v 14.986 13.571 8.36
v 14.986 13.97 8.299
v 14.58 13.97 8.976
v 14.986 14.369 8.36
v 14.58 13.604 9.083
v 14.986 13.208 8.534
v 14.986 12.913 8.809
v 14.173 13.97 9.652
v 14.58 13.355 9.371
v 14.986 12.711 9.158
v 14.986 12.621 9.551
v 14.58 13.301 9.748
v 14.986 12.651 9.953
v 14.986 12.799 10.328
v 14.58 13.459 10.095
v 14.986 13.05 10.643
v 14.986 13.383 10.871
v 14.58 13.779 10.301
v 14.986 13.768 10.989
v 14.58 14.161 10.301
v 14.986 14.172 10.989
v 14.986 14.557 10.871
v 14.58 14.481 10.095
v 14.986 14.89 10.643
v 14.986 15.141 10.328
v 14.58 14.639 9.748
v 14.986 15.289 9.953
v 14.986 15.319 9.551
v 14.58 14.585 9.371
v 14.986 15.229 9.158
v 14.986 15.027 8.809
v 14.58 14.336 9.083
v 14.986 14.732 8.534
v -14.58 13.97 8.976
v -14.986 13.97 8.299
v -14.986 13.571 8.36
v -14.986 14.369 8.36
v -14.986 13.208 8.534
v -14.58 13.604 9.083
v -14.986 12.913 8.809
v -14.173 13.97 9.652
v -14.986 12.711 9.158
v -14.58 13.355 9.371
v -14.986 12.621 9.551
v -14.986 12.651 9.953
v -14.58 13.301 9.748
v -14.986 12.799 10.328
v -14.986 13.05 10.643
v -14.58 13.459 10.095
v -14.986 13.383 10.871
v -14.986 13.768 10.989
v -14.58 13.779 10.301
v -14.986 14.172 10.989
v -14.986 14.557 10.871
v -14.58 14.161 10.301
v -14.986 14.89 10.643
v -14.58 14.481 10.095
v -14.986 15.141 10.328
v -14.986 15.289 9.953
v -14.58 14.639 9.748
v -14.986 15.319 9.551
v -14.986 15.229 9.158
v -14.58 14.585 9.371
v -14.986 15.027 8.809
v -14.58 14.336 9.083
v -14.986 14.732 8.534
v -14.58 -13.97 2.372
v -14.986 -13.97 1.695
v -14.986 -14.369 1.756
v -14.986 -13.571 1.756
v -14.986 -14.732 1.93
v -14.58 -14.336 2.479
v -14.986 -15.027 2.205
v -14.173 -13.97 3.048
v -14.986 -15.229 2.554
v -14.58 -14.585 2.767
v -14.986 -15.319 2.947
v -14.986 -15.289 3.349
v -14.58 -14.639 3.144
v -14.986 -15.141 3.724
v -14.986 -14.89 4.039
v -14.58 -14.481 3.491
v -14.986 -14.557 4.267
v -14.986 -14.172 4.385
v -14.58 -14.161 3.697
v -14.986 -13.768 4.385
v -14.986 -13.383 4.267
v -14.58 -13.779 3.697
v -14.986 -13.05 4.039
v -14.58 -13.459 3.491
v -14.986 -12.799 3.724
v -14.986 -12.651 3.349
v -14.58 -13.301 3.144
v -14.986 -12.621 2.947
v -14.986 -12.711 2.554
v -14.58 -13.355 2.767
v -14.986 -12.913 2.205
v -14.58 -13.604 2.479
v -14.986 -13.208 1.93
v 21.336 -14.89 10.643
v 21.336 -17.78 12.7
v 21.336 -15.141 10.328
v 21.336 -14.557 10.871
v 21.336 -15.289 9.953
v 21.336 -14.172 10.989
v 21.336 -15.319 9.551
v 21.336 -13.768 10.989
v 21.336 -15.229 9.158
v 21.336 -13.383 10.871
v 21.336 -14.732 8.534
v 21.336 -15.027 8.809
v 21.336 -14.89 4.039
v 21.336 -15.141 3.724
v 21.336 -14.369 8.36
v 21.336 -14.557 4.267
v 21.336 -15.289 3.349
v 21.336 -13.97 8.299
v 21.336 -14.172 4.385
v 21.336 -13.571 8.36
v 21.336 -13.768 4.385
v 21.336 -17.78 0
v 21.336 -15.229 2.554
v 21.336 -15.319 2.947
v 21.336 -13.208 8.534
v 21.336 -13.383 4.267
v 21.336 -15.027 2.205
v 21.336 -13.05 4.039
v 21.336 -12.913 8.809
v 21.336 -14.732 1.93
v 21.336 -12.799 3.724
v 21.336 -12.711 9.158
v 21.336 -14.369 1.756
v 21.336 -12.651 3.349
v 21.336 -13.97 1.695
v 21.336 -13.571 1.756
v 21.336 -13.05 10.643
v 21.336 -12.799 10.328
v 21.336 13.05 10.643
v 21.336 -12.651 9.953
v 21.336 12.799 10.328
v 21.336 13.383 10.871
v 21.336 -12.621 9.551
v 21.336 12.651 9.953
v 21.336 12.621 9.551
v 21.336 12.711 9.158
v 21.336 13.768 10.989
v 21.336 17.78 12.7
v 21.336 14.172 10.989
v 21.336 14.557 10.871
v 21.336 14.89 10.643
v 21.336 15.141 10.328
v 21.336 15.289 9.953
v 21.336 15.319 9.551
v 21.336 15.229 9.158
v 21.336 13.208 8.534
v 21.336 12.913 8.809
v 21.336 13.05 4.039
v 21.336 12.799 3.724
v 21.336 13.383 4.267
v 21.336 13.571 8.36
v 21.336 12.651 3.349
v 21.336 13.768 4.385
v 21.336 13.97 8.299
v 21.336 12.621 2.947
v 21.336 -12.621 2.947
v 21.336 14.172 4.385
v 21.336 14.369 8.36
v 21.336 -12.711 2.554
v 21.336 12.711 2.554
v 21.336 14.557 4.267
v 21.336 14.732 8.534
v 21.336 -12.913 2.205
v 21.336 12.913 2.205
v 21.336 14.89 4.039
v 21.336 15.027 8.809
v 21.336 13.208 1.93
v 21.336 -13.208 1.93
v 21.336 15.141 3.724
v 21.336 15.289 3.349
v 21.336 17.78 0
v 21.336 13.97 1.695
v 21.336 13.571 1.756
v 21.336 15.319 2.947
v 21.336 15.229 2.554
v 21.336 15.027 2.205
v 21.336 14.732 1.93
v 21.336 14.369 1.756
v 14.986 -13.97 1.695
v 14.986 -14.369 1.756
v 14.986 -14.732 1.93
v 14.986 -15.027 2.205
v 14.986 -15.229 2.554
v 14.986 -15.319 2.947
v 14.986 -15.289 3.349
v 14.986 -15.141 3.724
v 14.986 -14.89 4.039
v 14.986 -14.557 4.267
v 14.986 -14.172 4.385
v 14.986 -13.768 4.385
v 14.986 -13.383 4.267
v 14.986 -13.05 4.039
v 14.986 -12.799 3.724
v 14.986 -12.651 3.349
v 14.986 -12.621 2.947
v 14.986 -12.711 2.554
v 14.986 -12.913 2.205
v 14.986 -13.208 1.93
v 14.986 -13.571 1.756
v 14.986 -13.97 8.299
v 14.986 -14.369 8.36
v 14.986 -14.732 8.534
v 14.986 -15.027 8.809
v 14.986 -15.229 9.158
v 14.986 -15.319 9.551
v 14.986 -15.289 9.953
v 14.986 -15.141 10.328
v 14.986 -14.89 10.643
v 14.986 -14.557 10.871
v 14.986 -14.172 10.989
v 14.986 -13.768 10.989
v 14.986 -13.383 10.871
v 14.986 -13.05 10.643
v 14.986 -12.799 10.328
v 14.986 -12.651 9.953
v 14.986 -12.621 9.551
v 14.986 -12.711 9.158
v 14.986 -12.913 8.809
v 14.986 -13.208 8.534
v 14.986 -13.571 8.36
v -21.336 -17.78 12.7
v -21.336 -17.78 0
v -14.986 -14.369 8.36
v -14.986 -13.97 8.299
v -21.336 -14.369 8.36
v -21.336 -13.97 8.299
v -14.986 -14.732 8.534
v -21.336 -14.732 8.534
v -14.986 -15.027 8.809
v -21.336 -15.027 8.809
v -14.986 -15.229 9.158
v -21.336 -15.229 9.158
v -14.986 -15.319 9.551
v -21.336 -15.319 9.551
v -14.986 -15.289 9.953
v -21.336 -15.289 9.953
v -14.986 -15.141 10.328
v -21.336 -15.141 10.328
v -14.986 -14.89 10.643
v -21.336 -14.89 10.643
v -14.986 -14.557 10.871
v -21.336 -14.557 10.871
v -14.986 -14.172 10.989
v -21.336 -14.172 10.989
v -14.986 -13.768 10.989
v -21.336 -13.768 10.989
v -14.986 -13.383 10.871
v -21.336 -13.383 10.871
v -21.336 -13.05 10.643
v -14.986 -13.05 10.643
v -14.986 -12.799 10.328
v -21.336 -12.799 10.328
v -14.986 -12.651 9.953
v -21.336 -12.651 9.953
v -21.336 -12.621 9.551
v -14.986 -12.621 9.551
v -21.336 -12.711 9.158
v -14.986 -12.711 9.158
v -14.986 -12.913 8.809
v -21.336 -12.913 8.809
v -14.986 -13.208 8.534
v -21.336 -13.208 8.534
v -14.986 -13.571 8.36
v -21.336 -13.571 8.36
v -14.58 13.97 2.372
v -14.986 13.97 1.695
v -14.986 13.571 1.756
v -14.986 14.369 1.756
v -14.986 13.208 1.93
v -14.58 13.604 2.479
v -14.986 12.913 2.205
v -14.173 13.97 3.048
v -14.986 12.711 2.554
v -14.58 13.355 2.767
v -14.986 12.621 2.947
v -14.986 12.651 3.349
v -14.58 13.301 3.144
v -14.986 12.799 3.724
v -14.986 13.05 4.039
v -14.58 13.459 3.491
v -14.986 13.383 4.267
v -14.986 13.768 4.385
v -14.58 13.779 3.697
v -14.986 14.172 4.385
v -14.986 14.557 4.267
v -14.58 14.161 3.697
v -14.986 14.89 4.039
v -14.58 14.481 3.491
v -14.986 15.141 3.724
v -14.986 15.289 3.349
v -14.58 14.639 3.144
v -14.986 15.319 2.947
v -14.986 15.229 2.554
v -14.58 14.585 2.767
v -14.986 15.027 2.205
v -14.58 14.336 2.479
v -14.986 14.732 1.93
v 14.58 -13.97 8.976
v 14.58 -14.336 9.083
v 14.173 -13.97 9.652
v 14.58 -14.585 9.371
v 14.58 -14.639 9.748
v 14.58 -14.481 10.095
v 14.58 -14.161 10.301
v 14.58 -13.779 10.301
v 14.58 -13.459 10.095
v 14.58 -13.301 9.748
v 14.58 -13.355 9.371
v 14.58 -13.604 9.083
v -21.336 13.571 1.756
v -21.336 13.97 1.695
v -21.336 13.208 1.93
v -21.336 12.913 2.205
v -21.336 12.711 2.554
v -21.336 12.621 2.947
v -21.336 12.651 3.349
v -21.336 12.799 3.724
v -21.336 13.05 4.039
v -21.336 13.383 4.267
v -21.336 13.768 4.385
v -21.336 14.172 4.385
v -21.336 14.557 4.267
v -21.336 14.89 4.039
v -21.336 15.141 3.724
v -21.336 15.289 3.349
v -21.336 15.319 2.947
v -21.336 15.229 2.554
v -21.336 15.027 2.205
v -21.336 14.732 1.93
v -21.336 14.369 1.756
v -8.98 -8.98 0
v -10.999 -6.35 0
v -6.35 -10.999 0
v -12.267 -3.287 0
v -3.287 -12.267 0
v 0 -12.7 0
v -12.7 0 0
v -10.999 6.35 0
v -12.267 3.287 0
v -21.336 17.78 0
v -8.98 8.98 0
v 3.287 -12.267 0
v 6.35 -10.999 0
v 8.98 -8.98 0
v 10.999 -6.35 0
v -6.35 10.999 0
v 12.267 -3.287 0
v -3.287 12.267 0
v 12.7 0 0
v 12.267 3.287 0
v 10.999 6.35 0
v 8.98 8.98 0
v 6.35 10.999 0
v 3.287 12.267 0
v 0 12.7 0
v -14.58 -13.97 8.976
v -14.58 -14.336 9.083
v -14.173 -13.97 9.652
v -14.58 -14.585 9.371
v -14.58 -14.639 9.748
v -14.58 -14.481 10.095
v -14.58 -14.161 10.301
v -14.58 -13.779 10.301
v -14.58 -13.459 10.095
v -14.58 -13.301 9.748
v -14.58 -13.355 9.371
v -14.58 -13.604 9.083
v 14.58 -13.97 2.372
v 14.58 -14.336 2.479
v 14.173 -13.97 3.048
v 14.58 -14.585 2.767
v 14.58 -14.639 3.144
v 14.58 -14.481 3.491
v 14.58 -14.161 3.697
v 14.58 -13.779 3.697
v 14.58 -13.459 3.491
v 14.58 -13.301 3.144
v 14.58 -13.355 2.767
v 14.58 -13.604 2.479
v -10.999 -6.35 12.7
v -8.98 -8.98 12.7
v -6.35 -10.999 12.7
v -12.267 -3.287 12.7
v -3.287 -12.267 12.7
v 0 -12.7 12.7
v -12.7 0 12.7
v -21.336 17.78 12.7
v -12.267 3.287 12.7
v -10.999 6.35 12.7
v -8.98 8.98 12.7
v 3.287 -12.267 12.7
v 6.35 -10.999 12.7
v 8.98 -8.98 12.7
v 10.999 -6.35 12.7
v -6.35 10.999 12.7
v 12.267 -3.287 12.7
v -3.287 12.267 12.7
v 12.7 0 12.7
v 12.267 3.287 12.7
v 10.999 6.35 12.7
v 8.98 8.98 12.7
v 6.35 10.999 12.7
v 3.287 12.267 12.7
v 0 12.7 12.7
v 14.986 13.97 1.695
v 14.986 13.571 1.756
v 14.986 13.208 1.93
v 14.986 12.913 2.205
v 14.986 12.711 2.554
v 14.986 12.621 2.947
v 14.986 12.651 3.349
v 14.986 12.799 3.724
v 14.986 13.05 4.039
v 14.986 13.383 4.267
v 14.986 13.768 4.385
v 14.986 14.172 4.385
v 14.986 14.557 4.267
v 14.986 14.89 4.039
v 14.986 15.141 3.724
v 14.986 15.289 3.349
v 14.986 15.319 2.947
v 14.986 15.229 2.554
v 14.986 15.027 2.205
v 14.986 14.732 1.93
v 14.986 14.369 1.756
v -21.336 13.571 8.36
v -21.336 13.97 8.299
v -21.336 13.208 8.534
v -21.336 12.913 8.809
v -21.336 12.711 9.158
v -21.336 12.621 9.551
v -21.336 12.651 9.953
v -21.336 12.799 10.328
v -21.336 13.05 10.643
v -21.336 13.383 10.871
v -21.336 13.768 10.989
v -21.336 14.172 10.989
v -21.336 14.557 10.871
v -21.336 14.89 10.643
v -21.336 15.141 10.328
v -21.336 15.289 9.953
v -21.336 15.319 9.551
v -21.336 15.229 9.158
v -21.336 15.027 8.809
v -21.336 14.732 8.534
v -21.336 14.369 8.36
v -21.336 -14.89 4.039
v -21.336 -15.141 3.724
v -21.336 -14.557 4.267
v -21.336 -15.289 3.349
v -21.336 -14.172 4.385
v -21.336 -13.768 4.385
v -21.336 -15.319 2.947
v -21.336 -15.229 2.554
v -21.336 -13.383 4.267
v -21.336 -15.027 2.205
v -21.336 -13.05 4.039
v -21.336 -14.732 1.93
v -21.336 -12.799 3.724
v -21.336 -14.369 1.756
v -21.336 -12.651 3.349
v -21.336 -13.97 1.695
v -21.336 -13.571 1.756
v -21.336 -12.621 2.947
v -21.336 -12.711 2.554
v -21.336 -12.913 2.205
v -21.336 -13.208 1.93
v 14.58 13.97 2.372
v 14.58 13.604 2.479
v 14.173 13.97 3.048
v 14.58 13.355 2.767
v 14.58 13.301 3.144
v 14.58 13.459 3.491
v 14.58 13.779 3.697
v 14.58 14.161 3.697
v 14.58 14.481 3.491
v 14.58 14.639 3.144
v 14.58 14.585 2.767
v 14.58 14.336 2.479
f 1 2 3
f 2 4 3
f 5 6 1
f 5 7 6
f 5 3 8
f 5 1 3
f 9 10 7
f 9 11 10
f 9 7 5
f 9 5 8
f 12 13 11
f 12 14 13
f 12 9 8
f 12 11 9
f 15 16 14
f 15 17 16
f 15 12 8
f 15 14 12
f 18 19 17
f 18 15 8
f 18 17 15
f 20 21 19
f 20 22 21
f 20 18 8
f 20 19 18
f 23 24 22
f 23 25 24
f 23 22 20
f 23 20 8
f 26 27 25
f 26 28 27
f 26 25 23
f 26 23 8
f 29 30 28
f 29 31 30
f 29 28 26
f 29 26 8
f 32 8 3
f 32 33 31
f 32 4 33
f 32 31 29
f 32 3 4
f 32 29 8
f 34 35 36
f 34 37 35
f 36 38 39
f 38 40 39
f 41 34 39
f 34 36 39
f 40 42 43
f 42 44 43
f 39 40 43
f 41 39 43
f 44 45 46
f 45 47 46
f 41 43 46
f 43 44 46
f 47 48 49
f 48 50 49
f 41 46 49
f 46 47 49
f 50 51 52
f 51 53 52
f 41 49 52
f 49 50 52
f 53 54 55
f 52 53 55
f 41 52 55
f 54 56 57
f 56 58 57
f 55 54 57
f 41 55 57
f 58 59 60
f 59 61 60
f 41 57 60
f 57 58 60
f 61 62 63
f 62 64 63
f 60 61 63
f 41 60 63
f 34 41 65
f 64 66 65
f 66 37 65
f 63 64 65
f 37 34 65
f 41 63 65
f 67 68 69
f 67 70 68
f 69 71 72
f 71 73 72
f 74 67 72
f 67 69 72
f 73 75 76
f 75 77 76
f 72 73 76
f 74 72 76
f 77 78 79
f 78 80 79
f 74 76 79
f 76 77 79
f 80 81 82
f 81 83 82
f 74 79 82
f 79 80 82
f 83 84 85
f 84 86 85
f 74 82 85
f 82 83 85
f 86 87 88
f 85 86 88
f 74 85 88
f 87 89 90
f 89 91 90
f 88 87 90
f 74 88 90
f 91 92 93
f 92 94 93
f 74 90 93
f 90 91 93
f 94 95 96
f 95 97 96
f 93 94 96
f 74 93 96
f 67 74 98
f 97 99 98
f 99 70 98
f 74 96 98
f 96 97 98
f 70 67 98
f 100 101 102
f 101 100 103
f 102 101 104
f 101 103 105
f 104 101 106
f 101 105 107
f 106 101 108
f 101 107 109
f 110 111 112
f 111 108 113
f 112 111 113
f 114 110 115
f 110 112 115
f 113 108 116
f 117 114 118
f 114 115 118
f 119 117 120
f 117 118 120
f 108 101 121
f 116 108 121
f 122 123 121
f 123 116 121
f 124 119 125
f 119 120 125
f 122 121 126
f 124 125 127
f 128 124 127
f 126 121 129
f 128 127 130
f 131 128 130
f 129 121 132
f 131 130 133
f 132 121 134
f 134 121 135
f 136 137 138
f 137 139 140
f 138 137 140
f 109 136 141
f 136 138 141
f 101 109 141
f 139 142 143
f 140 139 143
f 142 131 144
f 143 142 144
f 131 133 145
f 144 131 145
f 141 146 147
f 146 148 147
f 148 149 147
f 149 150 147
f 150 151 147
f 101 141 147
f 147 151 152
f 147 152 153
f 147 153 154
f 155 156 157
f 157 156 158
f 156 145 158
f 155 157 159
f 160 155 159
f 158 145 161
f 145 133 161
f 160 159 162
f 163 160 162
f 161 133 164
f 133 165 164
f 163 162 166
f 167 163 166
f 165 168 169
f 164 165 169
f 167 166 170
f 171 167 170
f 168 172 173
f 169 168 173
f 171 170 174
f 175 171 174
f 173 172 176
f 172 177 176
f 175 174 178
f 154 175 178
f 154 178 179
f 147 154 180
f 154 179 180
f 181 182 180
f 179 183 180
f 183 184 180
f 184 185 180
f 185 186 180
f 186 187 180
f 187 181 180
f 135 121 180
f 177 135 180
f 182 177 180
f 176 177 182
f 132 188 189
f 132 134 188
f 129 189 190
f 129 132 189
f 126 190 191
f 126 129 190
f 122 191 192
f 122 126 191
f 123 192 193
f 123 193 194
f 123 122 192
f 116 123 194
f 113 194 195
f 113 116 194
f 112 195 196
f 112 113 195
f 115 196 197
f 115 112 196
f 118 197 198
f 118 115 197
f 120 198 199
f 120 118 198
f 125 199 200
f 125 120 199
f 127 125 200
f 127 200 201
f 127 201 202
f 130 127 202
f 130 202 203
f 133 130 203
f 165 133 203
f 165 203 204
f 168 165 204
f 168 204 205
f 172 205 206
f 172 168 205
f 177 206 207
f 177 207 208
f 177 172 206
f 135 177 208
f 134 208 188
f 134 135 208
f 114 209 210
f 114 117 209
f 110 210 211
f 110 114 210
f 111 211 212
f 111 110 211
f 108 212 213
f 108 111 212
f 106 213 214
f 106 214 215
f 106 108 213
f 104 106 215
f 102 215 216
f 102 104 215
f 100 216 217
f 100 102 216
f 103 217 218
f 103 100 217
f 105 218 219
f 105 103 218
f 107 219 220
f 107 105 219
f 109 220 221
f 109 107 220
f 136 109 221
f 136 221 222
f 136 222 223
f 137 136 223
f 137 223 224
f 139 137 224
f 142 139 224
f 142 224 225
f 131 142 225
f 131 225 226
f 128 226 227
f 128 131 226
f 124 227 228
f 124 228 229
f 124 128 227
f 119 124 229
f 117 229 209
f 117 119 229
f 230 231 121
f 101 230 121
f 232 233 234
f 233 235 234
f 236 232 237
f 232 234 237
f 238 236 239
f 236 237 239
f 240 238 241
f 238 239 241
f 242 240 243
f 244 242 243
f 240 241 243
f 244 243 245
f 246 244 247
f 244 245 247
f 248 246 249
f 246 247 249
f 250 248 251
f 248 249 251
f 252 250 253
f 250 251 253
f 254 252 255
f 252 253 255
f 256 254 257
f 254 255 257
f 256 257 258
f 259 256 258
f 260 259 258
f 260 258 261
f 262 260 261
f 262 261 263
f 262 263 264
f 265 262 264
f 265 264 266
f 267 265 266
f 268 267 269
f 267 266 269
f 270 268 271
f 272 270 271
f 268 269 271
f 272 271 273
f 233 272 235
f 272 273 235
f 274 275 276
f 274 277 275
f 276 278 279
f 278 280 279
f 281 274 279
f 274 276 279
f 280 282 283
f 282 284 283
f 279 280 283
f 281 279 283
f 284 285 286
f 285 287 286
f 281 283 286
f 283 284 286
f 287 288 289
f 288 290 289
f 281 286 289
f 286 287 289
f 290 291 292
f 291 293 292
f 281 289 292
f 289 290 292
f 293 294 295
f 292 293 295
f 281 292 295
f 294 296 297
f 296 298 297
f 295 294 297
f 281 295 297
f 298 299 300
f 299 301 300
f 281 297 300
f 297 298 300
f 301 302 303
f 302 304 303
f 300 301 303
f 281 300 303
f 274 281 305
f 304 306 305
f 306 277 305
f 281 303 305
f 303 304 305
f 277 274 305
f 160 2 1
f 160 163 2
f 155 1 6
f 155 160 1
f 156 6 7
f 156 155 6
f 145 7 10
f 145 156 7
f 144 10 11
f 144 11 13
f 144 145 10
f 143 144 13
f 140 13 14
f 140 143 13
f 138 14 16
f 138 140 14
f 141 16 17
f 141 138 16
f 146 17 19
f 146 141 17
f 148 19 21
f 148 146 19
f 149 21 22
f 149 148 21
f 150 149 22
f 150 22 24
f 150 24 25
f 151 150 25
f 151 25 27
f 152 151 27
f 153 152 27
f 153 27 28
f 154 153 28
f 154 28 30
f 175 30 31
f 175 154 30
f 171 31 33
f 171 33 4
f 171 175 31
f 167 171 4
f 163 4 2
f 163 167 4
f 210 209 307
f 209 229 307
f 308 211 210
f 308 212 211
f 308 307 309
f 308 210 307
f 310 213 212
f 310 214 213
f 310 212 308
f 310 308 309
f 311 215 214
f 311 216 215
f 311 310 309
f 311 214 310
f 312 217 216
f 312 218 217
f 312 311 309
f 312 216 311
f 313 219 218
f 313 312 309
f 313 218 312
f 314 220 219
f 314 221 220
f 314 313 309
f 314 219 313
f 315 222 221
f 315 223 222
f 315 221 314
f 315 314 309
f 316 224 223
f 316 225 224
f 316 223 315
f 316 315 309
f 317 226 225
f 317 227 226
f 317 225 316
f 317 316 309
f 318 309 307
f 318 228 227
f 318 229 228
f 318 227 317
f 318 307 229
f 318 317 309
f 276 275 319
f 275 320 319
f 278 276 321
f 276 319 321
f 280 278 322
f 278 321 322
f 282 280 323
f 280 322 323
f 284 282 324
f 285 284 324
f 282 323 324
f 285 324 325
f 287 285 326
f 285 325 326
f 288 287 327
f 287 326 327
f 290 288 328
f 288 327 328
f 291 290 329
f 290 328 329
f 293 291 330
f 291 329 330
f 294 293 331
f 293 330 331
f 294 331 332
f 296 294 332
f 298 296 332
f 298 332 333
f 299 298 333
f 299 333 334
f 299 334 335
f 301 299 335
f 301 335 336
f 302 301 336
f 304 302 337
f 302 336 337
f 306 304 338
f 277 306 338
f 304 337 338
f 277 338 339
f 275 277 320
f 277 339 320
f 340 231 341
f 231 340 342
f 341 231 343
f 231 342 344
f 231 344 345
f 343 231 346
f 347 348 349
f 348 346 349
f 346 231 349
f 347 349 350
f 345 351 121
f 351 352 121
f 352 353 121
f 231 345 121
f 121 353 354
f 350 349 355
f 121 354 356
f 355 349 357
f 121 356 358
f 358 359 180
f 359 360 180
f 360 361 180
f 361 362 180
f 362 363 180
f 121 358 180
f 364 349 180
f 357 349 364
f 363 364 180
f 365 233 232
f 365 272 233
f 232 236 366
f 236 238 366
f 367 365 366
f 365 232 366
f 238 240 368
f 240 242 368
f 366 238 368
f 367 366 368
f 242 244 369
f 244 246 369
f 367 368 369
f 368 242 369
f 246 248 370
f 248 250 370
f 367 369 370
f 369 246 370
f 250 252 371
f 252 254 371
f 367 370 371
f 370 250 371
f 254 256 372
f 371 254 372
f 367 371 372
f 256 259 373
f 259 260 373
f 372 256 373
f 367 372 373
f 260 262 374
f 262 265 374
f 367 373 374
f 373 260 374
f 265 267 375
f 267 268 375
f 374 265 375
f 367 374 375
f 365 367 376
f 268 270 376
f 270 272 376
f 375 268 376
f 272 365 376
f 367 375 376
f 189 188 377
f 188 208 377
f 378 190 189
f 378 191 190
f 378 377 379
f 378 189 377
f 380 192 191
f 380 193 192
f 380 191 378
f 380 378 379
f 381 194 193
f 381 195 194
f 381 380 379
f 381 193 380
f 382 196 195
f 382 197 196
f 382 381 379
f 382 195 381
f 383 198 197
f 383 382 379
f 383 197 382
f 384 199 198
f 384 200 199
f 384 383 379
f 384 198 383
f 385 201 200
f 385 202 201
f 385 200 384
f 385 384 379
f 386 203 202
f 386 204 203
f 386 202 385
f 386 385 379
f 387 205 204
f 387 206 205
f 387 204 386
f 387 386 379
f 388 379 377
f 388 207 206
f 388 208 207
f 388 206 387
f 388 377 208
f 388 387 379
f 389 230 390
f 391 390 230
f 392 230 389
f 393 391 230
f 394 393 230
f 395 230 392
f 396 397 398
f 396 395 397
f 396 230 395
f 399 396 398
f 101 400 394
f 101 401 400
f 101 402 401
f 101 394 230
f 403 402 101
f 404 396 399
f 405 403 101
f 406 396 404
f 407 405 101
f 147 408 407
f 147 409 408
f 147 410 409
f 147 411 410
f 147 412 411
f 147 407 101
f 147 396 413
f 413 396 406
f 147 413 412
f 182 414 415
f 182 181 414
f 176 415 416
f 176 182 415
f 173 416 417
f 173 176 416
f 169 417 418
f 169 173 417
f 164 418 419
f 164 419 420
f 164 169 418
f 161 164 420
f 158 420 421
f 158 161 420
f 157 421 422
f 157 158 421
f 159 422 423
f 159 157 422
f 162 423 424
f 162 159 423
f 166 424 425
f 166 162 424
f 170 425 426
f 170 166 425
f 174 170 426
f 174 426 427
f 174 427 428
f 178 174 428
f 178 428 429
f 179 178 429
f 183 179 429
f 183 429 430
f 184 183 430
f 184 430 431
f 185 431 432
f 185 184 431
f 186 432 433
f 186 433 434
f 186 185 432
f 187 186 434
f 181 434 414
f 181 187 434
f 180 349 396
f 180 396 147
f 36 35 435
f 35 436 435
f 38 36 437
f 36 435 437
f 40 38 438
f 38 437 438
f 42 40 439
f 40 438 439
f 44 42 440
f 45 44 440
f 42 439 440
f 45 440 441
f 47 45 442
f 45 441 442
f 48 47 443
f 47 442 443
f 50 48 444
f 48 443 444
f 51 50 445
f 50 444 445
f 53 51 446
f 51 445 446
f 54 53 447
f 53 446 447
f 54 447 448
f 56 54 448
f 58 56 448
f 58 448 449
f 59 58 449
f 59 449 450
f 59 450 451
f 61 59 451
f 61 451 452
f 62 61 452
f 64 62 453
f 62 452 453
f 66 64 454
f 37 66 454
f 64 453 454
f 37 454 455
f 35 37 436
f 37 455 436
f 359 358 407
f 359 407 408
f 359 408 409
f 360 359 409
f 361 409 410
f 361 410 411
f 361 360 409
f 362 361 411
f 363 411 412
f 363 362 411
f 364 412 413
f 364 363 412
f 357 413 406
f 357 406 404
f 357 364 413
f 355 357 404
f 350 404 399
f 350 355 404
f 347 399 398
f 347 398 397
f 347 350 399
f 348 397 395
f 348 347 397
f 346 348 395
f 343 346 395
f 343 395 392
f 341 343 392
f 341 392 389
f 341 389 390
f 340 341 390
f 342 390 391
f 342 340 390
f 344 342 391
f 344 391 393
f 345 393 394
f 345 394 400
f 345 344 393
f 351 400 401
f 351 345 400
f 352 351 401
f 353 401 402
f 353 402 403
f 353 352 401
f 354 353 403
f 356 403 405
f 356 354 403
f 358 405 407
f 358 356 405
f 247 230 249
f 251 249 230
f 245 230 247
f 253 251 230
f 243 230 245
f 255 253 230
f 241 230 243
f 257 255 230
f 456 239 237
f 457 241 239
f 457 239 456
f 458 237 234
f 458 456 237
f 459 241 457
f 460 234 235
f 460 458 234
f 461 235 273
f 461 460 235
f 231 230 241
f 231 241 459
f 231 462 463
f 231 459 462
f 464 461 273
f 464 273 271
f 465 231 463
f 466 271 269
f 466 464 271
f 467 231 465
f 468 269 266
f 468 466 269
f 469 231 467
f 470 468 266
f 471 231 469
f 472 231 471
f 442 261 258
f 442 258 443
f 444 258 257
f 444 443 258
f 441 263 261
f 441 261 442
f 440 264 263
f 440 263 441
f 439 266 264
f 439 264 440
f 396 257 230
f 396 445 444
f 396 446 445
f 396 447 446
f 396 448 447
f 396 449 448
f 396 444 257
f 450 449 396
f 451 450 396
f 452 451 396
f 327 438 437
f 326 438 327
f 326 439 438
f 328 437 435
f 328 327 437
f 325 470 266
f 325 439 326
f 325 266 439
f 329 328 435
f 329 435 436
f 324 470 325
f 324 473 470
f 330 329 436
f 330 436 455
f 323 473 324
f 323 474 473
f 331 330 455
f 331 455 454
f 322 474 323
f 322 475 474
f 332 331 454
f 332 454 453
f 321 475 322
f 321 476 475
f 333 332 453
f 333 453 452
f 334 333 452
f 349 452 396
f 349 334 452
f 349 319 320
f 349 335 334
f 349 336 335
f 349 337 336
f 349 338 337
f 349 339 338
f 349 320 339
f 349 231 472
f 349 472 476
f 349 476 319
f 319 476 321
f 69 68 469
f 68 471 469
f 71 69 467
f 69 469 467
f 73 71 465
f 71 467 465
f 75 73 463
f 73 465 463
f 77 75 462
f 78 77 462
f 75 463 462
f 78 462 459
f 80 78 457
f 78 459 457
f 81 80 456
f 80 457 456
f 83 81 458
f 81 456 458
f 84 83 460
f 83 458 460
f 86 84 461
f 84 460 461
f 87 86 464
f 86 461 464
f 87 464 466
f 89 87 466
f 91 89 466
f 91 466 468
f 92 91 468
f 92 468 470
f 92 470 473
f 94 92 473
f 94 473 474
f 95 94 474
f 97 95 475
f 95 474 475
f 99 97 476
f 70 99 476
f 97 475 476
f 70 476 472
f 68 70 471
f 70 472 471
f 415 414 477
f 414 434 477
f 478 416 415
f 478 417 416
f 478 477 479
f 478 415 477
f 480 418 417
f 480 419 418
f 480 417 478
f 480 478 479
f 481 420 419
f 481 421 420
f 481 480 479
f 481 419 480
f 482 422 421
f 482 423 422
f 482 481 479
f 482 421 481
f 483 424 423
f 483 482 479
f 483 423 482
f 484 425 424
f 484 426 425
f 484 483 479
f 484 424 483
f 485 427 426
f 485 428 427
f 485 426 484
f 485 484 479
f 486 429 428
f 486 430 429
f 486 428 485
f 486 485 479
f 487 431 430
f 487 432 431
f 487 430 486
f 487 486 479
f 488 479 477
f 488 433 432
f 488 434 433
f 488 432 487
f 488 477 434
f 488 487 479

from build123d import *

# Parameters (mm, degrees)
SKETCH2_W                          = 42.672
SKETCH2_H                          = 35.56
SKETCH2_R                          = 12.7
BOSS_EXTRUDE1_DEPTH                = 12.7
TAP_DRILL_FOR_6_32_TAP1_AT_2_COUNT = 2
TAP_DRILL_FOR_6_32_TAP1_AT_2_PITCH = 27.94
TAP_DRILL_FOR_6_32_TAP1_AT_3_COUNT = 2
TAP_DRILL_FOR_6_32_TAP1_AT_3_PITCH = 6.604
TAP_DRILL_FOR_6_32_TAP1_AT_4_COUNT = 2
TAP_DRILL_FOR_6_32_TAP1_AT_4_PITCH = 28.709866179


with BuildPart() as part:
    # Sketch2 → Boss-Extrude1 (new body)
    with BuildSketch(Plane.XY):
        Rectangle(SKETCH2_W, SKETCH2_H)
        Circle(SKETCH2_R, mode=Mode.SUBTRACT)
    extrude(amount=BOSS_EXTRUDE1_DEPTH)

    # Sketch4 → Tap Drill for #6-32 Tap1 (revolve, cut)
    with BuildSketch(Plane(origin=(21.336, 13.97, 3.048), x_dir=(0, 0, -1), z_dir=(0, 1, 0))):
        Polygon((0, 0), (0, 7.16269403), (1.35255, 6.35), (1.35255, 0), align=None)
    tap_drill_for_6_32_tap1 = revolve(axis=Axis((27.686, 13.97, 3.048), (-1, 0, 0)), mode=Mode.SUBTRACT)

    # Tap Drill for #6-32 Tap1 at 2: Tap Drill for #6-32 Tap1 ×2
    with Locations(*[(0, -i * TAP_DRILL_FOR_6_32_TAP1_AT_2_PITCH, 0) for i in range(1, TAP_DRILL_FOR_6_32_TAP1_AT_2_COUNT)]):
        add(tap_drill_for_6_32_tap1, mode=Mode.SUBTRACT)

    # Tap Drill for #6-32 Tap1 at 3: Tap Drill for #6-32 Tap1 ×2
    with Locations(*[(0, 0, i * TAP_DRILL_FOR_6_32_TAP1_AT_3_PITCH) for i in range(1, TAP_DRILL_FOR_6_32_TAP1_AT_3_COUNT)]):
        add(tap_drill_for_6_32_tap1, mode=Mode.SUBTRACT)

    # Tap Drill for #6-32 Tap1 at 4: Tap Drill for #6-32 Tap1 ×2
    with Locations(*[Vector(0, -0.9731846127764102, 0.23002545392896967) * (i * TAP_DRILL_FOR_6_32_TAP1_AT_4_PITCH) for i in range(1, TAP_DRILL_FOR_6_32_TAP1_AT_4_COUNT)]):
        add(tap_drill_for_6_32_tap1, mode=Mode.SUBTRACT)

    # Mirror1: Tap Drill for #6-32 Tap1 across plane
    add(tap_drill_for_6_32_tap1.mirror(Plane(origin=(0, 0, 0), x_dir=(0, 0, 1), z_dir=(1, 0, 0))), mode=Mode.SUBTRACT)

    # Mirror1 copy 1 sketch → Mirror1 copy 1 (revolve, cut)
    with BuildSketch(Plane(origin=(-21.336, -13.97, 3.048), x_dir=(0, 0, -1), z_dir=(0, 1, 0))):
        Polygon((0, 0), (0, -7.16269403), (1.35255, -6.35), (1.35255, 0), align=None)
    revolve(axis=Axis((-27.686, -13.97, 3.048), (-1, 0, 0)), mode=Mode.SUBTRACT)

    # Mirror1 copy 2 sketch → Mirror1 copy 2 (revolve, cut)
    with BuildSketch(Plane(origin=(-21.336, 13.97, 9.652), x_dir=(0, 0, -1), z_dir=(0, 1, 0))):
        Polygon((0, 0), (0, -7.16269403), (1.35255, -6.35), (1.35255, 0), align=None)
    revolve(axis=Axis((-27.686, 13.97, 9.652), (-1, 0, 0)), mode=Mode.SUBTRACT)

    # Mirror1 copy 3 sketch → Mirror1 copy 3 (revolve, cut)
    with BuildSketch(Plane(origin=(-21.336, -13.97, 9.652), x_dir=(0, 0, -1), z_dir=(0, 1, 0))):
        Polygon((0, 0), (0, -7.16269403), (1.35255, -6.35), (1.35255, 0), align=None)
    revolve(axis=Axis((-27.686, -13.97, 9.652), (-1, 0, 0)), mode=Mode.SUBTRACT)


solid = part.part
